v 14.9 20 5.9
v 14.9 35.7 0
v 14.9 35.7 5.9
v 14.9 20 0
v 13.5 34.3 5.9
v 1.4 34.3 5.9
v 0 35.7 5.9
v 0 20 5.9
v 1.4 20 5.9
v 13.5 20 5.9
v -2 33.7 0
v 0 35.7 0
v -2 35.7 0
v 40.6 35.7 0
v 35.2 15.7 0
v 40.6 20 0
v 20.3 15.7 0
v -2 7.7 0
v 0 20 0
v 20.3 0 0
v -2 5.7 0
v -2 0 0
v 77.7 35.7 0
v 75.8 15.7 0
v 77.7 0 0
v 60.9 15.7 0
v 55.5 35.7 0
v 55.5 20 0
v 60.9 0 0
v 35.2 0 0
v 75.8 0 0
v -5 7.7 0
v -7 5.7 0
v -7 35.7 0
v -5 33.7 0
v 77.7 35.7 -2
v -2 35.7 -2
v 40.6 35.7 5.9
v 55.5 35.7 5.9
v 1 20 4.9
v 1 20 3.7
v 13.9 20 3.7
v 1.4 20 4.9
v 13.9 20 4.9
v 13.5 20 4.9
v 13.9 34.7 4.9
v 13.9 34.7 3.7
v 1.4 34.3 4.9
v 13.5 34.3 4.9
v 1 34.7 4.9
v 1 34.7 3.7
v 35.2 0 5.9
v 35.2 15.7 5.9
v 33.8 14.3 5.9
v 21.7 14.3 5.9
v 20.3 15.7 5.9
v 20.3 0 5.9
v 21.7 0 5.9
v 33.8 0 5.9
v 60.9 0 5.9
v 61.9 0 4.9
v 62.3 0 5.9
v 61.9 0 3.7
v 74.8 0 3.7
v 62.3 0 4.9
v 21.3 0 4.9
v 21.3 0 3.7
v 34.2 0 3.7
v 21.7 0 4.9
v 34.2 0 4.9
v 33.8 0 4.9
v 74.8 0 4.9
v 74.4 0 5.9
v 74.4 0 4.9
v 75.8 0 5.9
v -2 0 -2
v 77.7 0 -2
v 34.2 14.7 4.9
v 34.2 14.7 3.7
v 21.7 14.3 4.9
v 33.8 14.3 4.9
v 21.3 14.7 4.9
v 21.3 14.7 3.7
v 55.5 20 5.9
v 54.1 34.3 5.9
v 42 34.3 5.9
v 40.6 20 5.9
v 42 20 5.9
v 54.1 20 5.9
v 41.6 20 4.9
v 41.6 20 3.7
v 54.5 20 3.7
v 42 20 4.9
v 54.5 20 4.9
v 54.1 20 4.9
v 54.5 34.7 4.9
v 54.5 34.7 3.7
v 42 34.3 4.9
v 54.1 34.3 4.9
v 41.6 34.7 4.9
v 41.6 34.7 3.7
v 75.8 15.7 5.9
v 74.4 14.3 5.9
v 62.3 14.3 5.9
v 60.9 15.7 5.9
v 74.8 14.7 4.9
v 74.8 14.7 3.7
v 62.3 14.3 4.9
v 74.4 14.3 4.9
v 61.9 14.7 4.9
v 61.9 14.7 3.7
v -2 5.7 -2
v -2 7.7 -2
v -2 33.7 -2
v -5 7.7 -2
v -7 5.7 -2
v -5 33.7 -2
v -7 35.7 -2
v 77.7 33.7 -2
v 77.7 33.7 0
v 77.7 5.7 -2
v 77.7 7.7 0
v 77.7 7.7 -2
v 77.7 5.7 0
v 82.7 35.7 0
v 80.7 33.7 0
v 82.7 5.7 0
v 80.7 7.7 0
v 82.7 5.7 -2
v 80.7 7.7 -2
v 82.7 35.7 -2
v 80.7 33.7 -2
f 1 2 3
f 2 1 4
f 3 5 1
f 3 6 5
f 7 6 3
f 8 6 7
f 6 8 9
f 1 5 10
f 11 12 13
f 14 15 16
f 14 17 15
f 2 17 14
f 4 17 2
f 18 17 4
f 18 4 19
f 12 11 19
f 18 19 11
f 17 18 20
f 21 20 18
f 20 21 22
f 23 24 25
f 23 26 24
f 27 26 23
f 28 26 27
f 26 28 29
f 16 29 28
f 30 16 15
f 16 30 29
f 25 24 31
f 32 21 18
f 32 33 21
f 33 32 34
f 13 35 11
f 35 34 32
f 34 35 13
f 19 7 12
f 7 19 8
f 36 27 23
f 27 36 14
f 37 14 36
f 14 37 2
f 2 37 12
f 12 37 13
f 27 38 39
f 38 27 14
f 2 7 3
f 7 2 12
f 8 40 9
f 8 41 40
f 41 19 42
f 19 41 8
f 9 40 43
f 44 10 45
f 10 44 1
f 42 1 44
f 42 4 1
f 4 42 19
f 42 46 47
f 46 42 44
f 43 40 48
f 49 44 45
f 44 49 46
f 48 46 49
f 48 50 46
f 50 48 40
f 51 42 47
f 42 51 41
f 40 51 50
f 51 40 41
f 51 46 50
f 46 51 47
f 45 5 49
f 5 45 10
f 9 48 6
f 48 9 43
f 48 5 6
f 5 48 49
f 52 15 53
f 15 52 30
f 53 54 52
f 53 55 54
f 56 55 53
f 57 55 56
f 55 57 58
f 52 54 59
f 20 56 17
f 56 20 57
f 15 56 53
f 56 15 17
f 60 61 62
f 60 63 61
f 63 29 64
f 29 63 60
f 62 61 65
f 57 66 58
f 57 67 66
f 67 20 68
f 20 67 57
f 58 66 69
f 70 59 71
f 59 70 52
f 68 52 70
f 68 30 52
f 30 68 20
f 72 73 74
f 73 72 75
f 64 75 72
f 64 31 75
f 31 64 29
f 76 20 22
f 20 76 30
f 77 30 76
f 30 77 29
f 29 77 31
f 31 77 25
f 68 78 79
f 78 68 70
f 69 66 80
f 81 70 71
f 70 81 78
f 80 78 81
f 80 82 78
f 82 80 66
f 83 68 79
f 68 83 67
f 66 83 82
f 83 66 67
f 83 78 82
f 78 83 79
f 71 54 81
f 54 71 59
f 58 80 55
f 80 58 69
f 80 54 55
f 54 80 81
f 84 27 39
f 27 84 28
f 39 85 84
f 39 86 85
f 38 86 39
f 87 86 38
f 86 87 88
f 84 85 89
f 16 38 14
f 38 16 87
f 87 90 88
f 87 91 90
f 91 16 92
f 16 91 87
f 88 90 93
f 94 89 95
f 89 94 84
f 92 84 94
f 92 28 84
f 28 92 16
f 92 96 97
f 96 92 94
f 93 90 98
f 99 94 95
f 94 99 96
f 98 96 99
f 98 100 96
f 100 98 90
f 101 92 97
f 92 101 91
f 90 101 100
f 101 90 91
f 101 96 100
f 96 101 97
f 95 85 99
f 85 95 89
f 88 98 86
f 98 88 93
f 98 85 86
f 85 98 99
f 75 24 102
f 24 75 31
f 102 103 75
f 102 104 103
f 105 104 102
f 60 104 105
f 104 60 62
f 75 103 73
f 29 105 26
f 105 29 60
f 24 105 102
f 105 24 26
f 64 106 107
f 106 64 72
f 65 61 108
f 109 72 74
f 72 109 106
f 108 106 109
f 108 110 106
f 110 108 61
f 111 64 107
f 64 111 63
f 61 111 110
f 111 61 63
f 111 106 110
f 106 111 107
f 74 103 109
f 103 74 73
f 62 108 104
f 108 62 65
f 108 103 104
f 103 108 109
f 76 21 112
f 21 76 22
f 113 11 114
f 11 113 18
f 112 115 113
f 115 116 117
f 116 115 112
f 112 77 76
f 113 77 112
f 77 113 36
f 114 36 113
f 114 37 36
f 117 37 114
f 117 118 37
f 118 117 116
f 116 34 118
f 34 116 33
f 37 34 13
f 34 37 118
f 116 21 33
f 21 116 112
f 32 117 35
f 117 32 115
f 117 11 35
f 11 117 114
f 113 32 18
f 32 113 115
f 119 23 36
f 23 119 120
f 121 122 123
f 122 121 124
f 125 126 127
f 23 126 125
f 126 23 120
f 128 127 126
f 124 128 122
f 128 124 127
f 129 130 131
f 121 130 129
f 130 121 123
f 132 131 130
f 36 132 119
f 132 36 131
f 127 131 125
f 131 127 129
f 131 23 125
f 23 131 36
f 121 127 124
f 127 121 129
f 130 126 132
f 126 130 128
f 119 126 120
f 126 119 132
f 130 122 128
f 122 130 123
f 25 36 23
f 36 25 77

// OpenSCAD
module sensorSlot(){
	difference(){
		cube([14.9,15.7,5.9],false);		//outer cube
		translate([1,0,3.7])					//inner cube
			cube([12.9,14.7,1.2],false);		
		translate([1.4,0,4.9])				//upper cube
			cube([12.1,14.3,1]);		
		
	}
}

distY = 20;
distX = 20.3;

//the four sensor slots
translate([0,distY,0])
	sensorSlot();
translate([distX,0,0])
	sensorSlot();
translate([2*distX,distY,0])
		sensorSlot();
translate([3*distX,0,0])
		sensorSlot();

//the "ground plate"
translate([-2,0,-2])
		color("blue") cube([79.7,35.7,2]);

//for the strap
translate([-7,5.7,-2])
	difference(){
		cube([5,30,2]);
		translate([2,2,0])
			cube([3,26,2]);
}

translate([82.7,5.7,-2])
	mirror(){
	difference(){
		cube([5,30,2]);
		translate([2,2,0])
			cube([3,26,2]);
}
}
